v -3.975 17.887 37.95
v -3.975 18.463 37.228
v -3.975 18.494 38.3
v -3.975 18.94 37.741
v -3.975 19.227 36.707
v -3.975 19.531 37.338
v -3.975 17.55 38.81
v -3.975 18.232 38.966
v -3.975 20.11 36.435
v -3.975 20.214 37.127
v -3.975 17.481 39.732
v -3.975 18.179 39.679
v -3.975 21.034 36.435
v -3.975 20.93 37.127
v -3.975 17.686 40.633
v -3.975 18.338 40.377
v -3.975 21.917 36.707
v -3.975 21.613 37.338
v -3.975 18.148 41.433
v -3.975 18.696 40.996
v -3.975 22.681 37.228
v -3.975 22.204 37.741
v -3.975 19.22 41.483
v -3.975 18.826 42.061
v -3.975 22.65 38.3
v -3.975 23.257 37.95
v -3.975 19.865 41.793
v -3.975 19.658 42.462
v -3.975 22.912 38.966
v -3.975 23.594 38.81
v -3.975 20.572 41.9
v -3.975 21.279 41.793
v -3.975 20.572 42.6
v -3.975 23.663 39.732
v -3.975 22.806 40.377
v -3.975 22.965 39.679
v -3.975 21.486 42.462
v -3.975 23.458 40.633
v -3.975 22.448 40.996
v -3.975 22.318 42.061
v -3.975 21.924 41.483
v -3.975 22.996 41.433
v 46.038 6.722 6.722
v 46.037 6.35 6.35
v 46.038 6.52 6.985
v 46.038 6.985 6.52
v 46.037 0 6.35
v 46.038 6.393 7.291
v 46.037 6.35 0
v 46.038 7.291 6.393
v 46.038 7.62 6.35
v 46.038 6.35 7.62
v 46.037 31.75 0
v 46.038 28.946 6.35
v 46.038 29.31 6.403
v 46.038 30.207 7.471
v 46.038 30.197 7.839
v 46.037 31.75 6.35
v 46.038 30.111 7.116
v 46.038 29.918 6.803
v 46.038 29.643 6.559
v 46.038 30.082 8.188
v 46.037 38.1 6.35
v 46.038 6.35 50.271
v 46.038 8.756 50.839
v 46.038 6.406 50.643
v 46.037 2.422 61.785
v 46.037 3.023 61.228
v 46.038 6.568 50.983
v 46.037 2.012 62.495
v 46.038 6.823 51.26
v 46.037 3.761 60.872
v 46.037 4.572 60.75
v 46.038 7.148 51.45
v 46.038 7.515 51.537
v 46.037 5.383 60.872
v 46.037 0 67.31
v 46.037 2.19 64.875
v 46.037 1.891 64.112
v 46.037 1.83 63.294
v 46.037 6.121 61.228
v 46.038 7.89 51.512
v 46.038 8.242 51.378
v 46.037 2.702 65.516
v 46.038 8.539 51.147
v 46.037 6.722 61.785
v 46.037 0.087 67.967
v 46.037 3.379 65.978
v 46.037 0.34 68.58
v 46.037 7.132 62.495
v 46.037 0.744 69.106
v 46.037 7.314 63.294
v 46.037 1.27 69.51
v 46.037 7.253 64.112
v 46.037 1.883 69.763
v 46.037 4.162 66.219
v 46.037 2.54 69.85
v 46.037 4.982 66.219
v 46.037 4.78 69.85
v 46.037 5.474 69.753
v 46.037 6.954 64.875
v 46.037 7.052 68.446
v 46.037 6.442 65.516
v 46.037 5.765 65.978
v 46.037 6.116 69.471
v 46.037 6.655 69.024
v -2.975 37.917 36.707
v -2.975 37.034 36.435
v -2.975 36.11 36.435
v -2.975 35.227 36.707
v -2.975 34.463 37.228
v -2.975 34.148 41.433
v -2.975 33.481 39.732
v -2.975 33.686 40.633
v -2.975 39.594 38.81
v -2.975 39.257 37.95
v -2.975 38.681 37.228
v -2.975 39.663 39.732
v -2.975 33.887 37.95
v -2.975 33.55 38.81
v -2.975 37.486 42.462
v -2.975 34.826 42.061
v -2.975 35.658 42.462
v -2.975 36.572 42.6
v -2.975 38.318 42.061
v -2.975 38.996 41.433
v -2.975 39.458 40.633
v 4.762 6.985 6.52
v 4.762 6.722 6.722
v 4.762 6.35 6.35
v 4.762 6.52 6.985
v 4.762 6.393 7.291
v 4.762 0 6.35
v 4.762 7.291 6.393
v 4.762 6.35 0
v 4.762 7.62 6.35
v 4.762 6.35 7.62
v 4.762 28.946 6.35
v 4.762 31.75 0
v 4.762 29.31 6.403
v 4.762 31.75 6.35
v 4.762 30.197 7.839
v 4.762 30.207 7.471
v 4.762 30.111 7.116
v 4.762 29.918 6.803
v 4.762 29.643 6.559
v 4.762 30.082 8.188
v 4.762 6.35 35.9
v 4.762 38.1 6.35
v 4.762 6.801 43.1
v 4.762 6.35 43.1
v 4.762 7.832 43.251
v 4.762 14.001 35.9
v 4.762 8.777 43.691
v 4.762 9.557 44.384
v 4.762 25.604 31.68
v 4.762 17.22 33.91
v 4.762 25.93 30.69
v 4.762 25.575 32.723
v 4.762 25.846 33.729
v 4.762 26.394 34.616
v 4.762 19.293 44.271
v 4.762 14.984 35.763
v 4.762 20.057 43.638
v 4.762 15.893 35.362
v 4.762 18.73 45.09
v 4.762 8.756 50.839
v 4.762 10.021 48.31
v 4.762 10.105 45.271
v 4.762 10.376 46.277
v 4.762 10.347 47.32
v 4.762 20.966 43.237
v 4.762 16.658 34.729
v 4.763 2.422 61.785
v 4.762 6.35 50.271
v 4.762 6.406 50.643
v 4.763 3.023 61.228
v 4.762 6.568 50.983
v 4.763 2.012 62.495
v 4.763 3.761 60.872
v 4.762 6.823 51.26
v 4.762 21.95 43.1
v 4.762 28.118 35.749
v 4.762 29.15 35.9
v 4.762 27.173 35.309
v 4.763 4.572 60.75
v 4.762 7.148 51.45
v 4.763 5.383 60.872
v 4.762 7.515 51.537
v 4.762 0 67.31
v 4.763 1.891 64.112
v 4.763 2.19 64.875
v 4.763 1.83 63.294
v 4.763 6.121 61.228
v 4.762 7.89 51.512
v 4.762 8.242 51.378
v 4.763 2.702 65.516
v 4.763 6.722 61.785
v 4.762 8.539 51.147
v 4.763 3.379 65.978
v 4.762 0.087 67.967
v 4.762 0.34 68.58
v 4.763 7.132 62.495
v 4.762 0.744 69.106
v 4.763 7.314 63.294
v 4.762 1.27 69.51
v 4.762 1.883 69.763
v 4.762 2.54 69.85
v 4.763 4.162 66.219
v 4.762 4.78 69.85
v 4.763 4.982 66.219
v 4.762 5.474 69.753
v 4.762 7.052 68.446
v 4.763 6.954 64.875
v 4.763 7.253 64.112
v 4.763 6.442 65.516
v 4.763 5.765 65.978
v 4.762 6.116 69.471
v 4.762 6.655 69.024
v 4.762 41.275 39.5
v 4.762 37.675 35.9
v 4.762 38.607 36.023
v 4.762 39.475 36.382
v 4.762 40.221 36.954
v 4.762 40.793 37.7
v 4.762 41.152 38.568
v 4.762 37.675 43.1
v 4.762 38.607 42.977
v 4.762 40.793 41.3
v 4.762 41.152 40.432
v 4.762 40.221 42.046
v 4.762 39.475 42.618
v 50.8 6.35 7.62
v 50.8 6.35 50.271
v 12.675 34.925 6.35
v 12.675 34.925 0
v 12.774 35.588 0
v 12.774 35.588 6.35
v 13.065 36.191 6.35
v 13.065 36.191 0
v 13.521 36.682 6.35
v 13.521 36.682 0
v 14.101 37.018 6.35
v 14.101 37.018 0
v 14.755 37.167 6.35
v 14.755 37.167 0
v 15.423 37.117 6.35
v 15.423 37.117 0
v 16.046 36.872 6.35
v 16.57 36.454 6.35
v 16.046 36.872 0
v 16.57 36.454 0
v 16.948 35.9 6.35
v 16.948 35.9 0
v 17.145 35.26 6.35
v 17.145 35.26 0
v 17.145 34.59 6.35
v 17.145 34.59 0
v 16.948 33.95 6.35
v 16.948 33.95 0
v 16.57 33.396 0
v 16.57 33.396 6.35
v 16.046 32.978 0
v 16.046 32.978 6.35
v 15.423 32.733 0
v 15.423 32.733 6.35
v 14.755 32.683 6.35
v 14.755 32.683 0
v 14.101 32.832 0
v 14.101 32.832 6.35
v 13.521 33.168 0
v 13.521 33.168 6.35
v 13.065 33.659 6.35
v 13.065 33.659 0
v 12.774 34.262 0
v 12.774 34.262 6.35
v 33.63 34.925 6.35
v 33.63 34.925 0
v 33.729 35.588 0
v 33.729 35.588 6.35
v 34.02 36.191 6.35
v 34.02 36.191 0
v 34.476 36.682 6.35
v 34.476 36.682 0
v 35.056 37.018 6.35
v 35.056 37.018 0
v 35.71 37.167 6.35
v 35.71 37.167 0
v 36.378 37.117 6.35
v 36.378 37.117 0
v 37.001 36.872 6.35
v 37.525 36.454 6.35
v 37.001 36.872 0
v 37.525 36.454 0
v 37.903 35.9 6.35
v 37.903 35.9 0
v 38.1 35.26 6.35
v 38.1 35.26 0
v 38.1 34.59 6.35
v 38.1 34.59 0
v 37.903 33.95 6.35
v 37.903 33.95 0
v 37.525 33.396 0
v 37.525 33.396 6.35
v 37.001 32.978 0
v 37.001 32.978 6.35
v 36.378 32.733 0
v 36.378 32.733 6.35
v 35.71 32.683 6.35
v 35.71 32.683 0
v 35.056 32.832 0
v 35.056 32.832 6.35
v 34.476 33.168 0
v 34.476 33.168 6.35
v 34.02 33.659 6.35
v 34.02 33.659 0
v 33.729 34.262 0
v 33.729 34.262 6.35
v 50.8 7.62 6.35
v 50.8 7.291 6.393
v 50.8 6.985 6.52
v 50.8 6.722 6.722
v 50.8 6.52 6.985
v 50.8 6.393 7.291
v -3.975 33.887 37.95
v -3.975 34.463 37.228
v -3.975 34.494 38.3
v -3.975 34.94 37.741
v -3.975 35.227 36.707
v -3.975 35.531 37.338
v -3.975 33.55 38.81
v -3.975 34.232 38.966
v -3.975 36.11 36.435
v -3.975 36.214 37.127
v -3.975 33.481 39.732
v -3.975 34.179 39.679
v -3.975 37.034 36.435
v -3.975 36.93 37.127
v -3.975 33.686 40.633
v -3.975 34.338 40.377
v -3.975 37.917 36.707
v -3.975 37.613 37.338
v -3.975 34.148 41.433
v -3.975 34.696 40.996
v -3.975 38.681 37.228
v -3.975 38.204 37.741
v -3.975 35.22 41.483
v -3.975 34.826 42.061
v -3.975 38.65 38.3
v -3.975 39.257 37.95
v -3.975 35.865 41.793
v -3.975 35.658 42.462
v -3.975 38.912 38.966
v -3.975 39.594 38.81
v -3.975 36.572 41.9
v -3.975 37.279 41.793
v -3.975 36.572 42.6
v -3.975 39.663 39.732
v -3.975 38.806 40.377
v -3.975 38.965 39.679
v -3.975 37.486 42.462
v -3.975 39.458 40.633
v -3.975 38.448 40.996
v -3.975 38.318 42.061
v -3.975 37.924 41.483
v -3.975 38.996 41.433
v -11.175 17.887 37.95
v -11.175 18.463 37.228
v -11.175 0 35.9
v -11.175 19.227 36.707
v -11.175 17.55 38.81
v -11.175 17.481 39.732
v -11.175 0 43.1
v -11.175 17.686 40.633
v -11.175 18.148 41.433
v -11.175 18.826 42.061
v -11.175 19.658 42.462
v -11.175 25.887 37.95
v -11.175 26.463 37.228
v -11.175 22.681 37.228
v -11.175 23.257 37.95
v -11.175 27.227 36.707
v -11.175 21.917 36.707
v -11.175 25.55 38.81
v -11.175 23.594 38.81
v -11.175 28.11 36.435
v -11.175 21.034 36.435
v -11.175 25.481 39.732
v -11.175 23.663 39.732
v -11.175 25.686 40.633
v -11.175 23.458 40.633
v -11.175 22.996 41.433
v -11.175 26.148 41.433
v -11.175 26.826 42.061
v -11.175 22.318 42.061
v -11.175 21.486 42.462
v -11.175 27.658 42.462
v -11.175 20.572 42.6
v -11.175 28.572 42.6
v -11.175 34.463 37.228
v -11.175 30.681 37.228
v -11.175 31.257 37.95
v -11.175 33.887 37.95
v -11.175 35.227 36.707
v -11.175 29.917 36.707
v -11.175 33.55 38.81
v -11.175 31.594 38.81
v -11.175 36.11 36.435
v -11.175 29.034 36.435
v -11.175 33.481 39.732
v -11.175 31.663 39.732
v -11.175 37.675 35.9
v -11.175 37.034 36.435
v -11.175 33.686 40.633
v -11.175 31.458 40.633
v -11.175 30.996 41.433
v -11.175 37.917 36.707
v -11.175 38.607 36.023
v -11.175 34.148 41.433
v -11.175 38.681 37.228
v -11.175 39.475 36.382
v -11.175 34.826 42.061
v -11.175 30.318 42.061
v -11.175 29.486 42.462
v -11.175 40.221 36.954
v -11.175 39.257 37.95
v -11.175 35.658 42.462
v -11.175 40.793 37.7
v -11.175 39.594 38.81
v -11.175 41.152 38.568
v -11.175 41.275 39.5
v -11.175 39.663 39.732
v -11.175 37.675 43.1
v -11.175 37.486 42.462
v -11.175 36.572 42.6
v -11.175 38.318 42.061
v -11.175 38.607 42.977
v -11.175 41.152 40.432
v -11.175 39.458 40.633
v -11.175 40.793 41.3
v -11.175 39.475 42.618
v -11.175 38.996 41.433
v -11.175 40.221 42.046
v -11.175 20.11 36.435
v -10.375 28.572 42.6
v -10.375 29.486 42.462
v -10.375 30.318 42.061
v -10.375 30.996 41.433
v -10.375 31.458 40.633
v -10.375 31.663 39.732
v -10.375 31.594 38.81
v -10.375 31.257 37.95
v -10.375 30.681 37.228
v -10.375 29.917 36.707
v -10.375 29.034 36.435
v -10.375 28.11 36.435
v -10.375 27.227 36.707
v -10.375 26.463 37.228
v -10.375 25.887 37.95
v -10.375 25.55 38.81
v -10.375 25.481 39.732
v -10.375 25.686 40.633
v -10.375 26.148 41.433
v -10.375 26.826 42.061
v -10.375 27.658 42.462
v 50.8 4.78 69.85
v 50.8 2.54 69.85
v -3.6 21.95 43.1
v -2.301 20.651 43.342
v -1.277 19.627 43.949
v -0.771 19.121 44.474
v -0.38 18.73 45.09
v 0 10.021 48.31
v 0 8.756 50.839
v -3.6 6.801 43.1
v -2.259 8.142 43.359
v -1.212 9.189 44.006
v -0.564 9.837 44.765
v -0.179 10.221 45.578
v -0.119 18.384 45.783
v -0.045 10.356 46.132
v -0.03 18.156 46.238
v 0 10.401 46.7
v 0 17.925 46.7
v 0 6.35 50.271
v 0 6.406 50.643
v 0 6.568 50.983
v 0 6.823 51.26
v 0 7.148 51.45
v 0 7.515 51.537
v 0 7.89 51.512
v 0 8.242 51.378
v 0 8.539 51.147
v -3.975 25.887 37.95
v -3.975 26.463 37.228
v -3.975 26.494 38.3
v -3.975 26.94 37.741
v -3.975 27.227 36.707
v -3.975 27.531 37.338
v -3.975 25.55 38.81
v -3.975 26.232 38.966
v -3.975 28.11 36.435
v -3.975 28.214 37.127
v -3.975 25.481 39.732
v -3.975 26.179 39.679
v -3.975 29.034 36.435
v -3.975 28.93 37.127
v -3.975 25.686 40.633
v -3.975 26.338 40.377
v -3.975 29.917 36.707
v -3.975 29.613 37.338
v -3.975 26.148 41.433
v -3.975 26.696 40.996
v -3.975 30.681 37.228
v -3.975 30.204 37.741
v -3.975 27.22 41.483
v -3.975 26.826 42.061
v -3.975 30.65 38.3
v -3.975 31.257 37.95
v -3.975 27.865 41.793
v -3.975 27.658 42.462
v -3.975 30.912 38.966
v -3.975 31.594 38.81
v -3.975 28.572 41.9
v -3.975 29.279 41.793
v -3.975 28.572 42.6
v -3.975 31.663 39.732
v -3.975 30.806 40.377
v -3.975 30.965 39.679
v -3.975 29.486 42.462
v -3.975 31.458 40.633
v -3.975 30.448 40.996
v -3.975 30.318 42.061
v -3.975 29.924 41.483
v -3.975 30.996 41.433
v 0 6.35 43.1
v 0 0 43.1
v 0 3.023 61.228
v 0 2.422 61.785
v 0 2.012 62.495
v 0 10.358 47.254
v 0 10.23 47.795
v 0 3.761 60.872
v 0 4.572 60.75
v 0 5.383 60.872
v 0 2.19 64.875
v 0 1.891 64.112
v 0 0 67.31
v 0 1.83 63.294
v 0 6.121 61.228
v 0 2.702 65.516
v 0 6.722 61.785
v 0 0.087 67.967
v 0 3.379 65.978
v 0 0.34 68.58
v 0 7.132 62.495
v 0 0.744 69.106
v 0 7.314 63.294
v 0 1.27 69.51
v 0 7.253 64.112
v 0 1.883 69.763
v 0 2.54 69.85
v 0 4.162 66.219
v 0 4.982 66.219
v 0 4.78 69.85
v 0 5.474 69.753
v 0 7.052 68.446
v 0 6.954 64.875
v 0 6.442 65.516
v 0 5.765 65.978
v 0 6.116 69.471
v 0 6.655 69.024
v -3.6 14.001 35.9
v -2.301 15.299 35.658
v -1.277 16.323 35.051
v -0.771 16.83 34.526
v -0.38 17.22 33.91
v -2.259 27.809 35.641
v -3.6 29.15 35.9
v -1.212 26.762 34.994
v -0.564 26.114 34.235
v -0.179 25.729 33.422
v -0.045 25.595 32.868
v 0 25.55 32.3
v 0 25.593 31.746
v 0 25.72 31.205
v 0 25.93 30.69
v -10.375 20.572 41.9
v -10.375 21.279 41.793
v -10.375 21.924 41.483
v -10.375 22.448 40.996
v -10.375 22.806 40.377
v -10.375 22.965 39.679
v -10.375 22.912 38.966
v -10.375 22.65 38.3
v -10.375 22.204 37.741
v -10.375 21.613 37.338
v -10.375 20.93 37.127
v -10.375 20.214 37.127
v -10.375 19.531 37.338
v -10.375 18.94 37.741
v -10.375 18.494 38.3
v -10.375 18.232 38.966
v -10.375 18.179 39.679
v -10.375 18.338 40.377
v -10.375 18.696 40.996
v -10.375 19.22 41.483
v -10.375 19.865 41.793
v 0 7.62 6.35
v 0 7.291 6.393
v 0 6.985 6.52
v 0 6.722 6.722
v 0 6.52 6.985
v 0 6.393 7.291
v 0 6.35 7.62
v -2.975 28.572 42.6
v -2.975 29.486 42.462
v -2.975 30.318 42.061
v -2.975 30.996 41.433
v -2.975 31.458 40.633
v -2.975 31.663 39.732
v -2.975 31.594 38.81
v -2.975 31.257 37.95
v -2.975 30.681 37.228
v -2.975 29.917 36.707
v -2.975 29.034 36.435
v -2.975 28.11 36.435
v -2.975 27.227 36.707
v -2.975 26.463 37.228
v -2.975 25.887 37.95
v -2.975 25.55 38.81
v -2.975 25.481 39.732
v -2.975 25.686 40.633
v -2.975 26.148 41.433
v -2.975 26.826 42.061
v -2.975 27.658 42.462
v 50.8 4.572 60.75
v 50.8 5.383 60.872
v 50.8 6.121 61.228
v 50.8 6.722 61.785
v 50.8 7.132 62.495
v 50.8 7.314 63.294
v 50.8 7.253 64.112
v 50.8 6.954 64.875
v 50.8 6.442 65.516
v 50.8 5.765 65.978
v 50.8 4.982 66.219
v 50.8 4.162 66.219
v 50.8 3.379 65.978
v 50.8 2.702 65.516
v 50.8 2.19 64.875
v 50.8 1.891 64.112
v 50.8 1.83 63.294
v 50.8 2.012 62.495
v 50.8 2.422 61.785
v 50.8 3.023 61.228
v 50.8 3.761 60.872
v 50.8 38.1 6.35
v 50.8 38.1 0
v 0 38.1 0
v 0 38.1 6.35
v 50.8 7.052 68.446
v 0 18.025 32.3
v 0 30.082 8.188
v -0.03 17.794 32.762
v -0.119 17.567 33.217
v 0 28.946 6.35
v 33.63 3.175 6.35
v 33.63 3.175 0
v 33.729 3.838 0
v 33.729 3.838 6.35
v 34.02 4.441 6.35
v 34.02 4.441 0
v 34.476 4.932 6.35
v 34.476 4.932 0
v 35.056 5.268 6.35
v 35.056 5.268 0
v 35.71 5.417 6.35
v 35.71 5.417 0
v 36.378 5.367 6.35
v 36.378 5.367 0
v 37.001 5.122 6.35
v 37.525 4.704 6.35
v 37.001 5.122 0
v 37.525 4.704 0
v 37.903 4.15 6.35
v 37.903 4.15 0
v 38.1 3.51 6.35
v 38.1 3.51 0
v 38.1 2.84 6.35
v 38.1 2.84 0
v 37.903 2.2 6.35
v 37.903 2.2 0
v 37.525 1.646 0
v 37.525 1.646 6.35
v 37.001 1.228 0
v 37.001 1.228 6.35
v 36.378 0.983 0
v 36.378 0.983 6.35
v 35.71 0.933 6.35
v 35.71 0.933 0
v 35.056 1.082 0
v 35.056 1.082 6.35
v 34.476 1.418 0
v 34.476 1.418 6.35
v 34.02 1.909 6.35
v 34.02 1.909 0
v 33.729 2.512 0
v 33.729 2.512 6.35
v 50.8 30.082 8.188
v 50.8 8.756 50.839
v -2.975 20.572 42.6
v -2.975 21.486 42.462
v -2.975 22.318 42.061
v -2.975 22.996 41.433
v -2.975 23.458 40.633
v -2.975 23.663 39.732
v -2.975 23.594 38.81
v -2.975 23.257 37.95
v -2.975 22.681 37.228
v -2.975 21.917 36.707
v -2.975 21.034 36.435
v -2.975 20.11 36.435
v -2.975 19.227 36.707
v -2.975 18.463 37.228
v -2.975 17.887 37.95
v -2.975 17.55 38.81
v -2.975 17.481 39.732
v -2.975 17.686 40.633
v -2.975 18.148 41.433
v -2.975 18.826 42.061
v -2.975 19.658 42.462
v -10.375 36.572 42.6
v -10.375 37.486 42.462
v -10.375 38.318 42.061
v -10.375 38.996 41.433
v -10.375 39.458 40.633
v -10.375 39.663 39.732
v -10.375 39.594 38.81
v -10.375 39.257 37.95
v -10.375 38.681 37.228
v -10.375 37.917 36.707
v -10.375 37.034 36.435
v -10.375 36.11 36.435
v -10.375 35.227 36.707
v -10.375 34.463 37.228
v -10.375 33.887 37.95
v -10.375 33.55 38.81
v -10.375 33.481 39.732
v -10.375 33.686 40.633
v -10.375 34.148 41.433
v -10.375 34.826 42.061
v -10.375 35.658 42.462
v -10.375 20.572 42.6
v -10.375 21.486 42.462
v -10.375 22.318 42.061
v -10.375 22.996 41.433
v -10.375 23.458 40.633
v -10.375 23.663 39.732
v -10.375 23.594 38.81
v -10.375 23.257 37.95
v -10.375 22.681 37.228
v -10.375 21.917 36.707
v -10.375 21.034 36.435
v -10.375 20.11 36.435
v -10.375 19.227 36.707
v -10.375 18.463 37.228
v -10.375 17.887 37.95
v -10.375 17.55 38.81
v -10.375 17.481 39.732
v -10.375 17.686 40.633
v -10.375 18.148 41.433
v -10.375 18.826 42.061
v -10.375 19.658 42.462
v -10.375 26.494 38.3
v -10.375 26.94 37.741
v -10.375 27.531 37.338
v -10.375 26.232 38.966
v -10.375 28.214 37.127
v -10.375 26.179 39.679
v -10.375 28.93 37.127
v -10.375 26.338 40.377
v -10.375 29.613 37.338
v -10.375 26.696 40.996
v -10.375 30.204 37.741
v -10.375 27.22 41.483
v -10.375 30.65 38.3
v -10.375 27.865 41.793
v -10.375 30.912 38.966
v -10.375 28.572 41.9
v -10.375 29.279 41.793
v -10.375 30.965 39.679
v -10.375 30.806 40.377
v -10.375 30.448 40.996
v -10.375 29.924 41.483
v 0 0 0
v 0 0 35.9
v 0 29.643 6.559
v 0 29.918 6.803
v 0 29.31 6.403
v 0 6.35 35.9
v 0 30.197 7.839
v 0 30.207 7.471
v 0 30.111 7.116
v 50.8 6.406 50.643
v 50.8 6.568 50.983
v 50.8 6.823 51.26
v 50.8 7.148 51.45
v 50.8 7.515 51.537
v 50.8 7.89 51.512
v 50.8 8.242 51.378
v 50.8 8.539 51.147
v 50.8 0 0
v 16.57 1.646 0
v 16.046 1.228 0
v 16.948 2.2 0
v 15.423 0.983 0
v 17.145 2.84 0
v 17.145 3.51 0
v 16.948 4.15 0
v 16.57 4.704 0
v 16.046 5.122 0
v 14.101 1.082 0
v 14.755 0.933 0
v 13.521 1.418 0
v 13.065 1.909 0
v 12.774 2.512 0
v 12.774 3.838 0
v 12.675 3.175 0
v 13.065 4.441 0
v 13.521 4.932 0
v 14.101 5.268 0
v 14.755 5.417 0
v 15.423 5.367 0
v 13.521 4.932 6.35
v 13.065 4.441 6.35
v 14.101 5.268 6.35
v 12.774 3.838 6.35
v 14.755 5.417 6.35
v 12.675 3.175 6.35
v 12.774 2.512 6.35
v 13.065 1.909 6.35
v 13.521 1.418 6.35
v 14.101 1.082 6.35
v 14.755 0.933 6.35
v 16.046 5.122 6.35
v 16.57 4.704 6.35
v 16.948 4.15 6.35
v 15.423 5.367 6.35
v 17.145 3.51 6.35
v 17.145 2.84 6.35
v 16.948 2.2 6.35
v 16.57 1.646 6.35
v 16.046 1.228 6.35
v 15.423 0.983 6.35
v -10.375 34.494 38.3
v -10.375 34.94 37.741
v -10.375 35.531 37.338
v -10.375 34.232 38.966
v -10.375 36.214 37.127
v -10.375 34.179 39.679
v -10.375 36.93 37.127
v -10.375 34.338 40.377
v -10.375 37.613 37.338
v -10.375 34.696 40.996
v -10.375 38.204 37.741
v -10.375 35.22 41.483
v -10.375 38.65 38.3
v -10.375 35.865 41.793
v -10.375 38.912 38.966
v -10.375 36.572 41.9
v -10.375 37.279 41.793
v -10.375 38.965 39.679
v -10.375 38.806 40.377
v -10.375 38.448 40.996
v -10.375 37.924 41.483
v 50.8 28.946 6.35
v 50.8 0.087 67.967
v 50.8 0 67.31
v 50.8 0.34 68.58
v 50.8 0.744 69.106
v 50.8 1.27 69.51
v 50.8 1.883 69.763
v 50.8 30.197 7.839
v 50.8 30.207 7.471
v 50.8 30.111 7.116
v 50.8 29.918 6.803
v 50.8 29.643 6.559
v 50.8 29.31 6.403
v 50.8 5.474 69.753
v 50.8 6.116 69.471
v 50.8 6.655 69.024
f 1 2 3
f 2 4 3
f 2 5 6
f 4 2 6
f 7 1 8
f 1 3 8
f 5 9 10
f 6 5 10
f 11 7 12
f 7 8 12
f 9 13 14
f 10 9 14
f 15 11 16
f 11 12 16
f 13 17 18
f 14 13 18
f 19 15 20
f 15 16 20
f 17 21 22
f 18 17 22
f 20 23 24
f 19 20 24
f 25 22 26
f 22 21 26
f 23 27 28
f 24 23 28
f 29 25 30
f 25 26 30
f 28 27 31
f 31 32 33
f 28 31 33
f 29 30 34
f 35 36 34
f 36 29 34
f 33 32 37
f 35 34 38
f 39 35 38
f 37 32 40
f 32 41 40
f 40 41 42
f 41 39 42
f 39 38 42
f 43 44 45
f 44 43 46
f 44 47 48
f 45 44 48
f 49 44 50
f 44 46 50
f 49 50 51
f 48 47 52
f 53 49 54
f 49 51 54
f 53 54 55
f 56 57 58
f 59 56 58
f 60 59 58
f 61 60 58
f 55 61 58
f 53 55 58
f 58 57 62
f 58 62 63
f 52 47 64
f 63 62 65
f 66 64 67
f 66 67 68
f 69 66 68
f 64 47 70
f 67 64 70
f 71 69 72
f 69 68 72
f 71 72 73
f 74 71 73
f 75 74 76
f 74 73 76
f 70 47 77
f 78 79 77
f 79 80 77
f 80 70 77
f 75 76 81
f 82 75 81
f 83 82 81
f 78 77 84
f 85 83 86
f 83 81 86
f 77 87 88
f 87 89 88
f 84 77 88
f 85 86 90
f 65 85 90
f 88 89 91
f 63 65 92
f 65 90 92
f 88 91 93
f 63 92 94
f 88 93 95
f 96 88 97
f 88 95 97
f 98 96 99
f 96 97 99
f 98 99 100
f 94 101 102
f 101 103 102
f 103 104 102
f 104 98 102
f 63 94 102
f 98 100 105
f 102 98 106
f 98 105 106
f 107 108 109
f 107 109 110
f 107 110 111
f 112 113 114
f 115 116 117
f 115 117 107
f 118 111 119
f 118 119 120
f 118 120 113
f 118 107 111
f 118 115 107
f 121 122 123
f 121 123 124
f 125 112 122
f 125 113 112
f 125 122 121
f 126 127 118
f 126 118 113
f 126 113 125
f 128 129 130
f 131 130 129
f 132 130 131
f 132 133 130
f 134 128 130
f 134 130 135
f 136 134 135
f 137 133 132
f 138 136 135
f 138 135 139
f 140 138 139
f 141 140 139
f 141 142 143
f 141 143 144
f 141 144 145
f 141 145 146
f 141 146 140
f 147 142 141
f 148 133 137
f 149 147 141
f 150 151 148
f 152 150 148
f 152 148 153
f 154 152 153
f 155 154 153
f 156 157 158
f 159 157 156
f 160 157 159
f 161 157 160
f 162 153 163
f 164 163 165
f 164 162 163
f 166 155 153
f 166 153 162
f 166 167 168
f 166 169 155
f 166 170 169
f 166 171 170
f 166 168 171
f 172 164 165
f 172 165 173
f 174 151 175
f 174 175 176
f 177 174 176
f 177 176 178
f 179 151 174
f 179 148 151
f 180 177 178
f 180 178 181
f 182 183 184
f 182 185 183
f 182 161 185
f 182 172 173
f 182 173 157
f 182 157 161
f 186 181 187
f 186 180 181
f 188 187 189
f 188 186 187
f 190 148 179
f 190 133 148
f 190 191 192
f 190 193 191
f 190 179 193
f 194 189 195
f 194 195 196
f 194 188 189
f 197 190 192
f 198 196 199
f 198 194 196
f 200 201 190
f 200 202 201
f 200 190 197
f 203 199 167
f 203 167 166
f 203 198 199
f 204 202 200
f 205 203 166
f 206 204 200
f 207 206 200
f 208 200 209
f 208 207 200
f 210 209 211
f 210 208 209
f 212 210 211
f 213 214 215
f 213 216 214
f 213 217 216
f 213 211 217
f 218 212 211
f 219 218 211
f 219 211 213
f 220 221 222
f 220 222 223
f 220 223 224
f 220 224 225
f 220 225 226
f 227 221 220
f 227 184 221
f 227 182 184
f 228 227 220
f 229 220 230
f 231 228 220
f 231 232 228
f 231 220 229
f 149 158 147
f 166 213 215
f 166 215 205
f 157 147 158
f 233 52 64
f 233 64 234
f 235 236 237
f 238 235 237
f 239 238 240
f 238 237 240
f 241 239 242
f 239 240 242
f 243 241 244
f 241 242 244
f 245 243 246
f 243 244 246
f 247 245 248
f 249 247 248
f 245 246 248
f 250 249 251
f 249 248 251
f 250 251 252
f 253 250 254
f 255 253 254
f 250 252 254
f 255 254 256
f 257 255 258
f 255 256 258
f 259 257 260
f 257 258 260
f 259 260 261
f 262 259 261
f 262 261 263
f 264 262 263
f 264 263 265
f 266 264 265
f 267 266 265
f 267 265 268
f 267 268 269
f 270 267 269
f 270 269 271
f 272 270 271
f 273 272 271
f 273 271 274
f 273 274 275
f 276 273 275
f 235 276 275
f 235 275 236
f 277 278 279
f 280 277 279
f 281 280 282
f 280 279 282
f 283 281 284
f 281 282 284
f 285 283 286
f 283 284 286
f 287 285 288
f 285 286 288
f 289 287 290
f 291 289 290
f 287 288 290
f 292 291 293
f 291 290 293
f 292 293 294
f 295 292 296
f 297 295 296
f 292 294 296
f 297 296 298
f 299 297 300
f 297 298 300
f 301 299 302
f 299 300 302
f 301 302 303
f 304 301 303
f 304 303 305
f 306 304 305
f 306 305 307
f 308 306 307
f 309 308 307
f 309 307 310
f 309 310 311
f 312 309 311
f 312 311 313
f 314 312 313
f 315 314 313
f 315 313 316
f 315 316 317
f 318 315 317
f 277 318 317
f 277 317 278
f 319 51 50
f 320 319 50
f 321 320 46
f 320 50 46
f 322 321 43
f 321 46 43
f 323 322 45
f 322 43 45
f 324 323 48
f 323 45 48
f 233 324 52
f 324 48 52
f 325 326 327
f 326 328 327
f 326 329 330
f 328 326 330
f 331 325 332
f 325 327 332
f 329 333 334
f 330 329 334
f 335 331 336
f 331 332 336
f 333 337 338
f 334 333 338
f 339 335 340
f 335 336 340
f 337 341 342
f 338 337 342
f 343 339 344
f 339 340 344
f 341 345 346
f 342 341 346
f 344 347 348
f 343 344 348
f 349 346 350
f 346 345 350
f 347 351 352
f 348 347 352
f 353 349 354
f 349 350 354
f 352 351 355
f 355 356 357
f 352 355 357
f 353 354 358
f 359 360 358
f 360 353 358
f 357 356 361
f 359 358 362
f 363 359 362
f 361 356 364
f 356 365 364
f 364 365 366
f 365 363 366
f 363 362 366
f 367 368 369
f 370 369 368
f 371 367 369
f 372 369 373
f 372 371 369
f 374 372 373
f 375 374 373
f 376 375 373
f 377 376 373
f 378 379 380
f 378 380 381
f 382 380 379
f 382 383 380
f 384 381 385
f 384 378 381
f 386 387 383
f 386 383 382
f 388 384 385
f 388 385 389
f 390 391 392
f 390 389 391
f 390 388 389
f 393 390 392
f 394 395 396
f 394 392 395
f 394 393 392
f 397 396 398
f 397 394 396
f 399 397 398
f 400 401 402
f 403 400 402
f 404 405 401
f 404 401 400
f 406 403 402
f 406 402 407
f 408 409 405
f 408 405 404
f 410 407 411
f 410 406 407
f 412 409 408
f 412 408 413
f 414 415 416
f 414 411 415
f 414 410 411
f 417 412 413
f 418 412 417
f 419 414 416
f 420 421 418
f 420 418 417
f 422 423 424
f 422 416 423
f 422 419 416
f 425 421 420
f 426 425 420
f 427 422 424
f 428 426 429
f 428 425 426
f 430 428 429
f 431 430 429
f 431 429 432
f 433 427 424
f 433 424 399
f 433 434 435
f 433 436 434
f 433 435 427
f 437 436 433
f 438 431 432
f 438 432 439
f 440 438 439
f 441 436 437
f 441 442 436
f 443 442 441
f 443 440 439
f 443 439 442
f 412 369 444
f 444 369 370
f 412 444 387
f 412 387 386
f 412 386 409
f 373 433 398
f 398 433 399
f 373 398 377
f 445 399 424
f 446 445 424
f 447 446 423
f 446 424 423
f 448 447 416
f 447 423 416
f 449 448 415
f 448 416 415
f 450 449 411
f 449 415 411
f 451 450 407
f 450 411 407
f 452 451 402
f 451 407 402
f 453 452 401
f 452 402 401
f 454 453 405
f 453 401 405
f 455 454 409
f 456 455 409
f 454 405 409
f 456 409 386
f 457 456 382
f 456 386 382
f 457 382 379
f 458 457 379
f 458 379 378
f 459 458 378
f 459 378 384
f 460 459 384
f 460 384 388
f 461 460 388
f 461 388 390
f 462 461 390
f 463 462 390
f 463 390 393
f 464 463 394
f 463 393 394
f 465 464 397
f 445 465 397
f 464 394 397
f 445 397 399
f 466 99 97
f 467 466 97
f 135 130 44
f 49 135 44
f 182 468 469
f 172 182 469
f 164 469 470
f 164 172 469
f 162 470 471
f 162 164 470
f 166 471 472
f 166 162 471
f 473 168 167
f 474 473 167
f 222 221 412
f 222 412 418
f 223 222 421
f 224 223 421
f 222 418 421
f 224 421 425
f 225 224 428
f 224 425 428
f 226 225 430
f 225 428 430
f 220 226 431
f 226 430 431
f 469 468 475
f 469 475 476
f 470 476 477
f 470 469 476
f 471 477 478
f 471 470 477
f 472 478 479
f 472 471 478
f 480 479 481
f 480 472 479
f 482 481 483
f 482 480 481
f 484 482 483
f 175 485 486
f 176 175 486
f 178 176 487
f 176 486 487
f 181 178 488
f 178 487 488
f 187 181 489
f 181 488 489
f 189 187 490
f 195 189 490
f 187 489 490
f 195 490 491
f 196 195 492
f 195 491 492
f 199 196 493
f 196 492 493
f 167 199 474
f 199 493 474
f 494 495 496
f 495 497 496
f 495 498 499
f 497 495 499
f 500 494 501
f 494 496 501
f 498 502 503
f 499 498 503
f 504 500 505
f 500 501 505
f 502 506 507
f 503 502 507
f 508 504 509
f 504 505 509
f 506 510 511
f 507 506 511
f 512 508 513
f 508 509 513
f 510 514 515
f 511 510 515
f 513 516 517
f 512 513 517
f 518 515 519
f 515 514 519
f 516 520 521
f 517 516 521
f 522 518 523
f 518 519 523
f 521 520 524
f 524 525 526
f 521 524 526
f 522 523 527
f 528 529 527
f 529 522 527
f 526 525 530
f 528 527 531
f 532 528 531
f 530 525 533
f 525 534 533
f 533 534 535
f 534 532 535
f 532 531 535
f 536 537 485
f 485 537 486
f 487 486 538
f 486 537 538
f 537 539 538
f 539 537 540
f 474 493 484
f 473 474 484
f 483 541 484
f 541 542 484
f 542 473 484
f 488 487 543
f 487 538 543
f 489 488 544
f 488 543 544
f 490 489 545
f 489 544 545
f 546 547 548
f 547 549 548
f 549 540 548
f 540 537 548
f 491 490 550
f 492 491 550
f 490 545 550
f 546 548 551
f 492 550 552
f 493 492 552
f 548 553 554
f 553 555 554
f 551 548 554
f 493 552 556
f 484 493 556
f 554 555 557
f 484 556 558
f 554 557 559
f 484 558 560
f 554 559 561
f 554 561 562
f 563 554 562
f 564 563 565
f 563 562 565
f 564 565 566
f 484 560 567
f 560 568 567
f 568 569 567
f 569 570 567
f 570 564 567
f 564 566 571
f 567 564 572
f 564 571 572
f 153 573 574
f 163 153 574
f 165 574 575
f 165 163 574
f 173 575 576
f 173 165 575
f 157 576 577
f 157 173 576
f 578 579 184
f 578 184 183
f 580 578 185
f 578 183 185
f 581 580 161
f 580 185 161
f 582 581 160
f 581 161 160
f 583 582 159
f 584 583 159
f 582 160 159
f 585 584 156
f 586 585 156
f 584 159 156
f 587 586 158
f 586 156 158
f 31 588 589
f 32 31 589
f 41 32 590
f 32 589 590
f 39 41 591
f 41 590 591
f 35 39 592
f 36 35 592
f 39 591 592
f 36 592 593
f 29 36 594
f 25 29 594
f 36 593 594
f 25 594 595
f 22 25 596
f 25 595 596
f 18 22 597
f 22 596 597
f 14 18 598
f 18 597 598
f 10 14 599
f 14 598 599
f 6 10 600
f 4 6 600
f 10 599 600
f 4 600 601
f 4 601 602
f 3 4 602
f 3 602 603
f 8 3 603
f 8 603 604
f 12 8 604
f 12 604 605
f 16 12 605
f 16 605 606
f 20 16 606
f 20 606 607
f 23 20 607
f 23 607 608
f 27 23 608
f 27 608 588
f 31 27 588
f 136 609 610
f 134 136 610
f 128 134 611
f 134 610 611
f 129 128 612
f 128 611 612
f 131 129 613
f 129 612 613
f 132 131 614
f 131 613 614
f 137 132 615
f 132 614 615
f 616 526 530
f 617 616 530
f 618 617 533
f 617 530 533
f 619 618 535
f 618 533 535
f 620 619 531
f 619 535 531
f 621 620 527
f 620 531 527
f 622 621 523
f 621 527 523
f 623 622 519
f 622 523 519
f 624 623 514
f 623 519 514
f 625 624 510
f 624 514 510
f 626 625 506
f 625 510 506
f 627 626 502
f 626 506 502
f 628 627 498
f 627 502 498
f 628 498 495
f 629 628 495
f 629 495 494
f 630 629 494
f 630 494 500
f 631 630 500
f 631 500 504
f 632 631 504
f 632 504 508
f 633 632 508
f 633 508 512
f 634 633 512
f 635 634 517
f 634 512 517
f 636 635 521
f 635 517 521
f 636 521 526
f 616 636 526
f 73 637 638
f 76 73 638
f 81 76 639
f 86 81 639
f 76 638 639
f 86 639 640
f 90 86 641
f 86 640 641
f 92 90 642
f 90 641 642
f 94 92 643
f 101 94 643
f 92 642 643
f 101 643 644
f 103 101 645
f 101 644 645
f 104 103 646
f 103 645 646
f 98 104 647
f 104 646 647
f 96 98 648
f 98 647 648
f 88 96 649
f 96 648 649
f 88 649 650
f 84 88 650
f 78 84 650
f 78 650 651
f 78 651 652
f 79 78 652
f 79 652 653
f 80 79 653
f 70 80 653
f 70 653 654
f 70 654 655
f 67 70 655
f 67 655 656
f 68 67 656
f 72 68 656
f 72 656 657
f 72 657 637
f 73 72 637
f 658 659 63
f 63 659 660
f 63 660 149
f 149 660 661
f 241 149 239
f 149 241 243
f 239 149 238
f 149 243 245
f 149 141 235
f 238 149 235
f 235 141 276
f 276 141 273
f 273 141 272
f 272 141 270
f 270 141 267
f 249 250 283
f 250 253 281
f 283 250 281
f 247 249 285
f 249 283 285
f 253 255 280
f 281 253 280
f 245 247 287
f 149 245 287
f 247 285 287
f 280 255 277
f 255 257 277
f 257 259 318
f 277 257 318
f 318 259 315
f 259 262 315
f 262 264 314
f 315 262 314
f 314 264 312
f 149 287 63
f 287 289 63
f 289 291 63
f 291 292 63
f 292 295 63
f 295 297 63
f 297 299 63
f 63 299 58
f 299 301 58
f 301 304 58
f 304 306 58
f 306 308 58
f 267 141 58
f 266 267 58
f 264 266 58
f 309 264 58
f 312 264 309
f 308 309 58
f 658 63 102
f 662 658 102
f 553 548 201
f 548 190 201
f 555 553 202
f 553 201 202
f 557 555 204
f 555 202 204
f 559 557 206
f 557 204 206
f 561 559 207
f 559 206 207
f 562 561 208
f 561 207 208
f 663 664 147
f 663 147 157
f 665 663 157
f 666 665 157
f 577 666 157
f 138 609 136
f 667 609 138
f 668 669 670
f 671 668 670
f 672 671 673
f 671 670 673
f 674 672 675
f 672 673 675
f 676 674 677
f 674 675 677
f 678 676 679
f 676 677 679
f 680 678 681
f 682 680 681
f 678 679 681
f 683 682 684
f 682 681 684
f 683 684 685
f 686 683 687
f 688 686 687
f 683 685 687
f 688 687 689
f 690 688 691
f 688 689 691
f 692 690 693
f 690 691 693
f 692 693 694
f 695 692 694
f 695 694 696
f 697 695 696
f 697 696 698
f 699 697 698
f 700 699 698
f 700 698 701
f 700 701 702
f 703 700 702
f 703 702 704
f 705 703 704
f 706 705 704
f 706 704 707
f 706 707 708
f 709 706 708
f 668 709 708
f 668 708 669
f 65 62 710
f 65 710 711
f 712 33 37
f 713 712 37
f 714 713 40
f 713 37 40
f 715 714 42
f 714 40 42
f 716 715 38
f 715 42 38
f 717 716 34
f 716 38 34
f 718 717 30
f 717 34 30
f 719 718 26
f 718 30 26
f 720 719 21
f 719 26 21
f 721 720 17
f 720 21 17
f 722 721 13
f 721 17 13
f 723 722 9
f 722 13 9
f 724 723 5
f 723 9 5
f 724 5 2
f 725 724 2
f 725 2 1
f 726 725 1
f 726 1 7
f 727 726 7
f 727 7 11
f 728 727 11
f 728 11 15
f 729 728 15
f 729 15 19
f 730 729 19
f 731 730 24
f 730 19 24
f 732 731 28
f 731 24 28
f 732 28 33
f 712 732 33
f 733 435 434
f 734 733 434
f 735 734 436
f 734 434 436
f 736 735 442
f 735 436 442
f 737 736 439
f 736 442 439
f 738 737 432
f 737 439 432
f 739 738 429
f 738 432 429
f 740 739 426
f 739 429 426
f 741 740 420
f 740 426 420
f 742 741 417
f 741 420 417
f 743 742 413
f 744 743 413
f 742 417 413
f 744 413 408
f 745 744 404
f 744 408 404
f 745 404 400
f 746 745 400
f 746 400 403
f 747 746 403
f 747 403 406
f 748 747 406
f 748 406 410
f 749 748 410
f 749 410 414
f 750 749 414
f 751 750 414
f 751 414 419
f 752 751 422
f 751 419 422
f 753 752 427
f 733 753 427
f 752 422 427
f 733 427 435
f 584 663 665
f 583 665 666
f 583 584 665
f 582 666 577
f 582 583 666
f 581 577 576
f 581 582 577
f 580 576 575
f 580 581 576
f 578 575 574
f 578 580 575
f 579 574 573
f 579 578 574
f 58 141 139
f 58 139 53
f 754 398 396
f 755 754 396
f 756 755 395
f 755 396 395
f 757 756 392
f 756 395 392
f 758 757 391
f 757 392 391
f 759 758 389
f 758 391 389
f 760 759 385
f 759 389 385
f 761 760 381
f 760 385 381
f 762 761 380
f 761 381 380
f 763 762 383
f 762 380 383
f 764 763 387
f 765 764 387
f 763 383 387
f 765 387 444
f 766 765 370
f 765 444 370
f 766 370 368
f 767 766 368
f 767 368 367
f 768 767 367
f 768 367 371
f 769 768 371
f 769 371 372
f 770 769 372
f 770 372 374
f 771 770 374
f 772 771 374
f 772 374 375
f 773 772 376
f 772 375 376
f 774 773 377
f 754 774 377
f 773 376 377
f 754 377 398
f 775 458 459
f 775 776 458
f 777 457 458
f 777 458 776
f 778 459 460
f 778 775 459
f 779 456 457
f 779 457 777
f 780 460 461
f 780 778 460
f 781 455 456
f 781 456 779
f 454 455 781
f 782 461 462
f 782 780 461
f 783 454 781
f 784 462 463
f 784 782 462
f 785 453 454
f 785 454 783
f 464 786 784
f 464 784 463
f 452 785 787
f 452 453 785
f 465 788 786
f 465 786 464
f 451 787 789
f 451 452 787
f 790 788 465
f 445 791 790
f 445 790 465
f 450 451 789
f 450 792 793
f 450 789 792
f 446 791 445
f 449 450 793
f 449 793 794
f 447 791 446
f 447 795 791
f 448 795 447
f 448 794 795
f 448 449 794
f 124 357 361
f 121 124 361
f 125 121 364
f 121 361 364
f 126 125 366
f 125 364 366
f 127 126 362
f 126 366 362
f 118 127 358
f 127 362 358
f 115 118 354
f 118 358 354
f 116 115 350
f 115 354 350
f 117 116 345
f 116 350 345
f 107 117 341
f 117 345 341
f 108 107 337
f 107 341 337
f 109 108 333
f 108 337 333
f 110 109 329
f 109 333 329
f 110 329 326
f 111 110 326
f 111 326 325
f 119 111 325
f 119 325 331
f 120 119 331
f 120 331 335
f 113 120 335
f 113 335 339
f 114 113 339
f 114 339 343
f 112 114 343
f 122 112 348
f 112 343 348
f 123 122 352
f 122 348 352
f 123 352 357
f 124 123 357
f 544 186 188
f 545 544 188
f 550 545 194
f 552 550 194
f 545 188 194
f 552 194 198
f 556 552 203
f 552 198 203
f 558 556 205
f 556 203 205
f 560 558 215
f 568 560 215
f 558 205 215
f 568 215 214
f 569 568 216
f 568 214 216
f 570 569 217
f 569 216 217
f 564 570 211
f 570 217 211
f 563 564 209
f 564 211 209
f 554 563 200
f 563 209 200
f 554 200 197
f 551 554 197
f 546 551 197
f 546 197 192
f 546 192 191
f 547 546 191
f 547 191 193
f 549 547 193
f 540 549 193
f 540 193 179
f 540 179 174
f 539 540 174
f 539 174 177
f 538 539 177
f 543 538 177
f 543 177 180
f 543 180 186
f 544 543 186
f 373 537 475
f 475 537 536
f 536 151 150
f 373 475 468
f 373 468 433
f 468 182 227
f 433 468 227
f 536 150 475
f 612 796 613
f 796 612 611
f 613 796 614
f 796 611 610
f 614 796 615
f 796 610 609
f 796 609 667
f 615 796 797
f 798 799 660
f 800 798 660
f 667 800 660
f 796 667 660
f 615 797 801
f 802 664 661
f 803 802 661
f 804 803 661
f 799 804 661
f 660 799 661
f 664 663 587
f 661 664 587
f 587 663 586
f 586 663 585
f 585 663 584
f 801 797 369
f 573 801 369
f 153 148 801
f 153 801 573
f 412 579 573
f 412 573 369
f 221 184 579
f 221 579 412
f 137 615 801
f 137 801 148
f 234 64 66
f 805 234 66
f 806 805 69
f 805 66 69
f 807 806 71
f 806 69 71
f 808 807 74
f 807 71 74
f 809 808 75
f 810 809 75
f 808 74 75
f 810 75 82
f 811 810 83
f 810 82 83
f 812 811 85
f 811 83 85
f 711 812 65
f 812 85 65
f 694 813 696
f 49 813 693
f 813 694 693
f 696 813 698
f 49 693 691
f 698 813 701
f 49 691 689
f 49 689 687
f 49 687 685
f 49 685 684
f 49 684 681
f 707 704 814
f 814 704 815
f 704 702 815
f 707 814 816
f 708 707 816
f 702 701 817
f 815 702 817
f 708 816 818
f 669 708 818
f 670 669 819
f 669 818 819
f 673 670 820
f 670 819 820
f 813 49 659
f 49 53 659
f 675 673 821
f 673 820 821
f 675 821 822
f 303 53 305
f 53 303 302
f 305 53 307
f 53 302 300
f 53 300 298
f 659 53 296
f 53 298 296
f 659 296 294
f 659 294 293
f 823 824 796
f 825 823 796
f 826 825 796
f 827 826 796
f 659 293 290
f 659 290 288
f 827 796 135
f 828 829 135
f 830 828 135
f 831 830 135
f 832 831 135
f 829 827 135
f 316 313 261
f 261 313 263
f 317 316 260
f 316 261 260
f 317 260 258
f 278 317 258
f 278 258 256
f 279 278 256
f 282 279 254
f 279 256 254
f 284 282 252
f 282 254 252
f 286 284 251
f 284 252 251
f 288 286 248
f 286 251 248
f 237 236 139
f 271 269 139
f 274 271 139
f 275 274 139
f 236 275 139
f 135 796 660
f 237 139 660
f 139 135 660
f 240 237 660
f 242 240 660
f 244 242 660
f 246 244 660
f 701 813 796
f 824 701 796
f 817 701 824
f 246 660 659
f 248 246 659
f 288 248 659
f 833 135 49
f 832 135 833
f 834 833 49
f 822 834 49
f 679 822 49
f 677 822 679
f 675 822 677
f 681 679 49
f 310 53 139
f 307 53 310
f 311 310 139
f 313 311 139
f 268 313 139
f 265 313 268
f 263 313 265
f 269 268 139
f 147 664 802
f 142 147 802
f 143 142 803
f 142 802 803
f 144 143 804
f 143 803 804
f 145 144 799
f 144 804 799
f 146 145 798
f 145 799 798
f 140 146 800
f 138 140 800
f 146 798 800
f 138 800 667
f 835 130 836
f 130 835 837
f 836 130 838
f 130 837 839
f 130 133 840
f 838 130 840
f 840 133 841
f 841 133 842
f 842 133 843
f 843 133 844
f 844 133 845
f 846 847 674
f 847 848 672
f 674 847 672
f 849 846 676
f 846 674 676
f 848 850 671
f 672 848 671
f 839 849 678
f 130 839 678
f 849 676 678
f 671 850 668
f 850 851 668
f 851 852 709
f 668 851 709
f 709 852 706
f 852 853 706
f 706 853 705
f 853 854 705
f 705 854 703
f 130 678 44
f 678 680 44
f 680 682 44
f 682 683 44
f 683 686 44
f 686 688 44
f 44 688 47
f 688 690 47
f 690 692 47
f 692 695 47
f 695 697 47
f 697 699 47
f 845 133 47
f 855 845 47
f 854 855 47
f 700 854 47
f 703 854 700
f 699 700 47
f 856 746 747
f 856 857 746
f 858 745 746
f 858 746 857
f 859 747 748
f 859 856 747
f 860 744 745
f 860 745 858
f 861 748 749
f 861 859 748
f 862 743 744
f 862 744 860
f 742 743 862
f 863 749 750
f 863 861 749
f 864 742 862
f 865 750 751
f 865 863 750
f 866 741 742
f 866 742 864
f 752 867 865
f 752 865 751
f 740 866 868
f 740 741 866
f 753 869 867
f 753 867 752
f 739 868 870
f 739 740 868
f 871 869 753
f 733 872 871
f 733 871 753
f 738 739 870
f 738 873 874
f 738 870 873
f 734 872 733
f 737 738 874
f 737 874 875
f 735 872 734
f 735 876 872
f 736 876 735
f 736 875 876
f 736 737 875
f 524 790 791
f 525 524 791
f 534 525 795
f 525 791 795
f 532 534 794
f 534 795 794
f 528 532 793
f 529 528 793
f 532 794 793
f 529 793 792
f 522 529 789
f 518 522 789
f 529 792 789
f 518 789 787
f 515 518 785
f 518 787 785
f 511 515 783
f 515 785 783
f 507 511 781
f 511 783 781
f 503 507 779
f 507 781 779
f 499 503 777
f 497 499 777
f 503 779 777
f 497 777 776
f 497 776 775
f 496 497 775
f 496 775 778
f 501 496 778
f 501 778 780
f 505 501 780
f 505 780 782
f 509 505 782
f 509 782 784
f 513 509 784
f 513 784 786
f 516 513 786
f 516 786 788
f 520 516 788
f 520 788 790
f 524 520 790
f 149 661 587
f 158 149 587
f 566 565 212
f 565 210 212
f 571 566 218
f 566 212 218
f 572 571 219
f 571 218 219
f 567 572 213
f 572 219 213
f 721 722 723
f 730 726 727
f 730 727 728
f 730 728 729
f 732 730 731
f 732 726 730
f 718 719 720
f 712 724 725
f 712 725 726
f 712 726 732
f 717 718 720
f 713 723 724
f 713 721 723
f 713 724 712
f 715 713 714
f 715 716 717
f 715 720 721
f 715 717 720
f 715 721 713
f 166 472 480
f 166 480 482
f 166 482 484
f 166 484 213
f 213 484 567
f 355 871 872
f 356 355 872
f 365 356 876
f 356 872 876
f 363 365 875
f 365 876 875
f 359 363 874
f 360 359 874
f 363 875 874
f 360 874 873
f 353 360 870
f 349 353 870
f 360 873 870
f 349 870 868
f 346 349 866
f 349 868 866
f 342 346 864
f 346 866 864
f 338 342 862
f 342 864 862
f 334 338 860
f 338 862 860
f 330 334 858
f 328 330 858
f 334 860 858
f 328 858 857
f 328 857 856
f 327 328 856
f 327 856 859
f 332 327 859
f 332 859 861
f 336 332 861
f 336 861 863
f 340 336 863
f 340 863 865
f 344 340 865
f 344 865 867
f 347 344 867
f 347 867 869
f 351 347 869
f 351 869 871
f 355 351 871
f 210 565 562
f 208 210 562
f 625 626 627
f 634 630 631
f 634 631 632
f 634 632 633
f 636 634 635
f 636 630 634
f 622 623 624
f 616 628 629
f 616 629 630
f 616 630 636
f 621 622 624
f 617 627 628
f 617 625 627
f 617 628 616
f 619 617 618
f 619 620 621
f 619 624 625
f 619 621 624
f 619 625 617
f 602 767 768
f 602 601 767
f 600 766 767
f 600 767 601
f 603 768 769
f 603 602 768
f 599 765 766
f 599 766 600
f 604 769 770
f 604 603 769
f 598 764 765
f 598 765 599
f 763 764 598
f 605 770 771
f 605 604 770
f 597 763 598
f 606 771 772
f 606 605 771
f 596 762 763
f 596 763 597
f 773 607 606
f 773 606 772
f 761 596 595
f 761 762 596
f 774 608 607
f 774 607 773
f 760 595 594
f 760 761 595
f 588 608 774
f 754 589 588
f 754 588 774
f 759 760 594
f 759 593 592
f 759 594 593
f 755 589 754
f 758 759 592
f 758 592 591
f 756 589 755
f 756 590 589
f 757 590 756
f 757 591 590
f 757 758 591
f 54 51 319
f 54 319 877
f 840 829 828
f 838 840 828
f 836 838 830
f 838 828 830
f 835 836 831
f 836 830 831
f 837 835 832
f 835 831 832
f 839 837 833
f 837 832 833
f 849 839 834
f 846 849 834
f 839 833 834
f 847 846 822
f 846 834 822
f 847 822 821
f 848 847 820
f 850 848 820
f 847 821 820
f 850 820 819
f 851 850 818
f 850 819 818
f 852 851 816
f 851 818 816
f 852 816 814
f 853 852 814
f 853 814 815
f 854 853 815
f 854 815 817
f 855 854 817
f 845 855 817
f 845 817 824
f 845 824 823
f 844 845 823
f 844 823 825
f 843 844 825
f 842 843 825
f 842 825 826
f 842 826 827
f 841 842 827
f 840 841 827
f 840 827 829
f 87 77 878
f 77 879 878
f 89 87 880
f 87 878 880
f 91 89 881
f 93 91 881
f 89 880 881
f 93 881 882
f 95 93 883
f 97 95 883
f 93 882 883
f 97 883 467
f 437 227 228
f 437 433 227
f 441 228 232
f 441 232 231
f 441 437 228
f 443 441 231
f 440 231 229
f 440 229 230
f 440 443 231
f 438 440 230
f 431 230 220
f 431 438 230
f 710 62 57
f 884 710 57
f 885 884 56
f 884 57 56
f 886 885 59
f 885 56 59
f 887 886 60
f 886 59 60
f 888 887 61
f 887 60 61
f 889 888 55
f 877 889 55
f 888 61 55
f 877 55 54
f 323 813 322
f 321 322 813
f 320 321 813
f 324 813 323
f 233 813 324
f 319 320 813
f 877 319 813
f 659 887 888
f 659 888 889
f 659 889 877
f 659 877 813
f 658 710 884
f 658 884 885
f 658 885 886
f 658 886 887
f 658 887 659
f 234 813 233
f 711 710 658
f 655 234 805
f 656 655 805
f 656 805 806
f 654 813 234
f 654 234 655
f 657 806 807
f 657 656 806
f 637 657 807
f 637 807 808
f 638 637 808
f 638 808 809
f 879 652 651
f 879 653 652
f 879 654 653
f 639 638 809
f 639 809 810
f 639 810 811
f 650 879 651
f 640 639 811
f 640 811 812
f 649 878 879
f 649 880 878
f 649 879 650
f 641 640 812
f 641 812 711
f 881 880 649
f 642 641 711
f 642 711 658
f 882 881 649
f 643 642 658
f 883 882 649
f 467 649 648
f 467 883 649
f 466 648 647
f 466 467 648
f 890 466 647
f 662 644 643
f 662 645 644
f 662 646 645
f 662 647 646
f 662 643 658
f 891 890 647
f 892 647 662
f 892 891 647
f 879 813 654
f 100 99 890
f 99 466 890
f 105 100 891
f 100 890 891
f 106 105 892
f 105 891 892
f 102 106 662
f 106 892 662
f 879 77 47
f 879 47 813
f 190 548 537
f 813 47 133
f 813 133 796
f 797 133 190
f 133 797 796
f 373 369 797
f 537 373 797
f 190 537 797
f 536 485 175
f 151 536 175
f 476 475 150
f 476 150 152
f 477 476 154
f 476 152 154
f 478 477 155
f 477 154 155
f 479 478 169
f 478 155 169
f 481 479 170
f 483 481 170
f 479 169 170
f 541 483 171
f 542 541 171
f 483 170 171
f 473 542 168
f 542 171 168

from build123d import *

# Parameters (mm, degrees)
BOSS_EXTRUDE1_DEPTH   = 50.8
SKETCH2_W             = 41.275
SKETCH2_H             = 25.4
CUT_EXTRUDE1_DEPTH    = 95.399536545
SKETCH3_W             = 41.275
SKETCH3_H             = 63.5
CUT_EXTRUDE2_DEPTH    = 95.399536545
SKETCH4_R             = 2.75
CUT_EXTRUDE3_DEPTH    = 95.399536545
FILLET1_R             = 2.54
FILLET3_DEPTH         = 4.7625
FILLET3_START         = 46.0375
FILLET3_2_DEPTH       = 4.7625
F_8_CLEARANCE_HOLE1_D = 4.4958
BOSS_EXTRUDE2_START   = -4.7625
SKETCH9_W             = 7.2
SKETCH9_H             = 41.275
BOSS_EXTRUDE2_DEPTH   = 15.9375
SKETCH10_R            = 3.1
CUT_EXTRUDE4_DEPTH    = 0.8
SKETCH10_3_R          = 2.4
CUT_EXTRUDE5_DEPTH    = 7.2
CUT_EXTRUDE9_START    = -7.2
SKETCH10_4_R          = 3.1
SKETCH10_4_R_2        = 2.4
CUT_EXTRUDE9_DEPTH    = 1
FILLET4_R             = 3.6


with BuildPart() as part:
    # Sketch1 → Boss-Extrude1 (new body)
    with BuildSketch(Plane(origin=(0, 0, 0), x_dir=(0, 0, -1), z_dir=(1, 0, 0))):
        Polygon((0, 0), (0, 38.1), (-6.35, 38.1), (-69.85, 6.35), (-69.85, 0), align=None)
        Polygon((-55.650968343, 6.35), (-6.35, 6.35), (-6.35, 31.000484171), align=None, mode=Mode.SUBTRACT)
    extrude(amount=BOSS_EXTRUDE1_DEPTH)

    # Sketch2 → Cut-Extrude1 (cut, through all)
    with BuildSketch(Plane.XY.offset(69.85)):
        with Locations((25.4, 19.05)):
            Rectangle(SKETCH2_W, SKETCH2_H)
    extrude(amount=-CUT_EXTRUDE1_DEPTH, mode=Mode.SUBTRACT)

    # Sketch3 → Cut-Extrude2 (cut, through all)
    with BuildSketch(Plane.XZ):
        with Locations((25.4, 38.1)):
            Rectangle(SKETCH3_W, SKETCH3_H)
    extrude(amount=-CUT_EXTRUDE2_DEPTH, mode=Mode.SUBTRACT)

    # Sketch4 → Cut-Extrude3 (cut, through all)
    with BuildSketch(Plane(origin=(50.8, 0, 0), x_dir=(0, 0, -1), z_dir=(1, 0, 0))):
        with Locations((-63.5, 4.572)):
            Circle(SKETCH4_R)
    extrude(amount=-CUT_EXTRUDE3_DEPTH, mode=Mode.SUBTRACT)

    # Fillet1
    fillet1_edges = [part.edges().sort_by_distance(p)[0] for p in [
        (2.38125, 6.35, 69.85),
        (2.38125, 0, 69.85),
        (48.41875, 0, 69.85),
        (48.41875, 6.35, 69.85),
    ]]
    fillet(fillet1_edges, radius=FILLET1_R)

    # Fillet3: read off the stored shape, not the designer's step
    # Fillet3 outline → Fillet3 (add)
    with BuildSketch(Plane.YZ):
        with BuildLine():
            ThreePointArc((7.62, 6.35), (6.721974388, 6.721974388), (6.35, 7.62))
            Line((6.35, 7.62), (6.35, 6.35))
            Line((6.35, 6.35), (7.62, 6.35))
        make_face()
        with BuildLine():
            Line((6.35, 55.650968343), (6.35, 50.271162011))
            ThreePointArc((6.35, 50.271162011), (7.328213791, 51.507188228), (8.755922533, 50.839123278))
            Line((8.755922533, 50.839123278), (6.35, 55.650968343))
        make_face()
        with BuildLine():
            ThreePointArc((30.081503538, 8.187961266), (30.025907532, 6.952321488), (28.945581006, 6.35))
            Line((28.945581006, 6.35), (31.000484171, 6.35))
            Line((31.000484171, 6.35), (30.081503538, 8.187961266))
        make_face()
    extrude(amount=FILLET3_DEPTH)

    # Fillet3 2 outline → Fillet3 2 (add)
    with BuildSketch(Plane.YZ.offset(FILLET3_START)):
        with BuildLine():
            ThreePointArc((7.62, 6.35), (6.721974388, 6.721974388), (6.35, 7.62))
            Line((6.35, 7.62), (6.35, 6.35))
            Line((6.35, 6.35), (7.62, 6.35))
        make_face()
        with BuildLine():
            Line((6.35, 55.650968343), (6.35, 50.271162011))
            ThreePointArc((6.35, 50.271162011), (7.328213791, 51.507188228), (8.755922533, 50.839123278))
            Line((8.755922533, 50.839123278), (6.35, 55.650968343))
        make_face()
        with BuildLine():
            ThreePointArc((30.081503538, 8.187961266), (30.025907532, 6.952321488), (28.945581006, 6.35))
            Line((28.945581006, 6.35), (31.000484171, 6.35))
            Line((31.000484171, 6.35), (30.081503538, 8.187961266))
        make_face()
    extrude(amount=FILLET3_2_DEPTH)

    # #8 Clearance Hole1 (through all)
    with Locations(Plane.XY.offset(6.35)):
        with Locations((14.9225, 34.925), (35.8775, 34.925), (14.9225, 3.175), (35.8775, 3.175)):
            Hole(F_8_CLEARANCE_HOLE1_D / 2)

    # Sketch9 → Boss-Extrude2 (add)
    with BuildSketch(Plane.ZY.offset(BOSS_EXTRUDE2_START)):
        with Locations((39.5, 20.6375)):
            Rectangle(SKETCH9_W, SKETCH9_H)
    extrude(amount=BOSS_EXTRUDE2_DEPTH)

    # Sketch10 → Cut-Extrude4 (cut)
    with BuildSketch(Plane.ZY.offset(11.175)):
        with Locations((39.5, 36.572)):
            Circle(SKETCH10_R)
        with Locations((39.5, 28.572)):
            Circle(SKETCH10_R)
        with Locations((39.5, 20.572)):
            Circle(SKETCH10_R)
    extrude(amount=-CUT_EXTRUDE4_DEPTH, mode=Mode.SUBTRACT)

    # Sketch10<3> → Cut-Extrude5 (cut)
    with BuildSketch(Plane.ZY.offset(11.175)):
        with Locations((39.5, 20.572)):
            Circle(SKETCH10_3_R)
        with Locations((39.5, 36.572)):
            Circle(SKETCH10_3_R)
        with Locations((39.5, 28.572)):
            Circle(SKETCH10_3_R)
    extrude(amount=-CUT_EXTRUDE5_DEPTH, mode=Mode.SUBTRACT)

    # Sketch10<4> → Cut-Extrude9 (cut)
    # profile 1 of 5: a face of its own
    with BuildSketch(Plane.ZY.offset(11.175).offset(CUT_EXTRUDE9_START)):
        with Locations((39.5, 28.572)):
            Circle(SKETCH10_4_R)
        with Locations((39.5, 28.572)):
            Circle(SKETCH10_4_R_2, mode=Mode.SUBTRACT)
    # profile 2 of 5: a face of its own
    with BuildSketch(Plane.ZY.offset(11.175).offset(CUT_EXTRUDE9_START)):
        with Locations((39.5, 28.572)):
            Circle(SKETCH10_4_R_2)
    # profile 3 of 5: a face of its own
    with BuildSketch(Plane.ZY.offset(11.175).offset(CUT_EXTRUDE9_START)):
        with Locations((39.5, 20.572)):
            Circle(SKETCH10_4_R)
        with Locations((39.5, 20.572)):
            Circle(SKETCH10_4_R_2, mode=Mode.SUBTRACT)
    # profile 4 of 5: a face of its own
    with BuildSketch(Plane.ZY.offset(11.175).offset(CUT_EXTRUDE9_START)):
        with Locations((39.5, 20.572)):
            Circle(SKETCH10_4_R_2)
    # profile 5 of 5: a face of its own
    with BuildSketch(Plane.ZY.offset(11.175).offset(CUT_EXTRUDE9_START)):
        with Locations((39.5, 36.572)):
            Circle(SKETCH10_4_R)
    extrude(amount=-CUT_EXTRUDE9_DEPTH, mode=Mode.SUBTRACT)

    # Fillet4
    fillet4_edges = [part.edges().sort_by_distance(p)[0] for p in [
        (-3.20625, 41.275, 43.1),
        (-3.20625, 41.275, 35.9),
        (2.38125, 12.625484171, 43.1),
        (0, 16.175242086, 43.1),
        (2.38125, 19.725, 43.1),
        (2.38125, 16.225484171, 35.9),
        (0, 19.775242086, 35.9),
        (2.38125, 23.325, 35.9),
    ]]
    fillet(fillet4_edges, radius=FILLET4_R - 0.0001)  # a hair under: the kernel refuses the full size


solid = part.part
